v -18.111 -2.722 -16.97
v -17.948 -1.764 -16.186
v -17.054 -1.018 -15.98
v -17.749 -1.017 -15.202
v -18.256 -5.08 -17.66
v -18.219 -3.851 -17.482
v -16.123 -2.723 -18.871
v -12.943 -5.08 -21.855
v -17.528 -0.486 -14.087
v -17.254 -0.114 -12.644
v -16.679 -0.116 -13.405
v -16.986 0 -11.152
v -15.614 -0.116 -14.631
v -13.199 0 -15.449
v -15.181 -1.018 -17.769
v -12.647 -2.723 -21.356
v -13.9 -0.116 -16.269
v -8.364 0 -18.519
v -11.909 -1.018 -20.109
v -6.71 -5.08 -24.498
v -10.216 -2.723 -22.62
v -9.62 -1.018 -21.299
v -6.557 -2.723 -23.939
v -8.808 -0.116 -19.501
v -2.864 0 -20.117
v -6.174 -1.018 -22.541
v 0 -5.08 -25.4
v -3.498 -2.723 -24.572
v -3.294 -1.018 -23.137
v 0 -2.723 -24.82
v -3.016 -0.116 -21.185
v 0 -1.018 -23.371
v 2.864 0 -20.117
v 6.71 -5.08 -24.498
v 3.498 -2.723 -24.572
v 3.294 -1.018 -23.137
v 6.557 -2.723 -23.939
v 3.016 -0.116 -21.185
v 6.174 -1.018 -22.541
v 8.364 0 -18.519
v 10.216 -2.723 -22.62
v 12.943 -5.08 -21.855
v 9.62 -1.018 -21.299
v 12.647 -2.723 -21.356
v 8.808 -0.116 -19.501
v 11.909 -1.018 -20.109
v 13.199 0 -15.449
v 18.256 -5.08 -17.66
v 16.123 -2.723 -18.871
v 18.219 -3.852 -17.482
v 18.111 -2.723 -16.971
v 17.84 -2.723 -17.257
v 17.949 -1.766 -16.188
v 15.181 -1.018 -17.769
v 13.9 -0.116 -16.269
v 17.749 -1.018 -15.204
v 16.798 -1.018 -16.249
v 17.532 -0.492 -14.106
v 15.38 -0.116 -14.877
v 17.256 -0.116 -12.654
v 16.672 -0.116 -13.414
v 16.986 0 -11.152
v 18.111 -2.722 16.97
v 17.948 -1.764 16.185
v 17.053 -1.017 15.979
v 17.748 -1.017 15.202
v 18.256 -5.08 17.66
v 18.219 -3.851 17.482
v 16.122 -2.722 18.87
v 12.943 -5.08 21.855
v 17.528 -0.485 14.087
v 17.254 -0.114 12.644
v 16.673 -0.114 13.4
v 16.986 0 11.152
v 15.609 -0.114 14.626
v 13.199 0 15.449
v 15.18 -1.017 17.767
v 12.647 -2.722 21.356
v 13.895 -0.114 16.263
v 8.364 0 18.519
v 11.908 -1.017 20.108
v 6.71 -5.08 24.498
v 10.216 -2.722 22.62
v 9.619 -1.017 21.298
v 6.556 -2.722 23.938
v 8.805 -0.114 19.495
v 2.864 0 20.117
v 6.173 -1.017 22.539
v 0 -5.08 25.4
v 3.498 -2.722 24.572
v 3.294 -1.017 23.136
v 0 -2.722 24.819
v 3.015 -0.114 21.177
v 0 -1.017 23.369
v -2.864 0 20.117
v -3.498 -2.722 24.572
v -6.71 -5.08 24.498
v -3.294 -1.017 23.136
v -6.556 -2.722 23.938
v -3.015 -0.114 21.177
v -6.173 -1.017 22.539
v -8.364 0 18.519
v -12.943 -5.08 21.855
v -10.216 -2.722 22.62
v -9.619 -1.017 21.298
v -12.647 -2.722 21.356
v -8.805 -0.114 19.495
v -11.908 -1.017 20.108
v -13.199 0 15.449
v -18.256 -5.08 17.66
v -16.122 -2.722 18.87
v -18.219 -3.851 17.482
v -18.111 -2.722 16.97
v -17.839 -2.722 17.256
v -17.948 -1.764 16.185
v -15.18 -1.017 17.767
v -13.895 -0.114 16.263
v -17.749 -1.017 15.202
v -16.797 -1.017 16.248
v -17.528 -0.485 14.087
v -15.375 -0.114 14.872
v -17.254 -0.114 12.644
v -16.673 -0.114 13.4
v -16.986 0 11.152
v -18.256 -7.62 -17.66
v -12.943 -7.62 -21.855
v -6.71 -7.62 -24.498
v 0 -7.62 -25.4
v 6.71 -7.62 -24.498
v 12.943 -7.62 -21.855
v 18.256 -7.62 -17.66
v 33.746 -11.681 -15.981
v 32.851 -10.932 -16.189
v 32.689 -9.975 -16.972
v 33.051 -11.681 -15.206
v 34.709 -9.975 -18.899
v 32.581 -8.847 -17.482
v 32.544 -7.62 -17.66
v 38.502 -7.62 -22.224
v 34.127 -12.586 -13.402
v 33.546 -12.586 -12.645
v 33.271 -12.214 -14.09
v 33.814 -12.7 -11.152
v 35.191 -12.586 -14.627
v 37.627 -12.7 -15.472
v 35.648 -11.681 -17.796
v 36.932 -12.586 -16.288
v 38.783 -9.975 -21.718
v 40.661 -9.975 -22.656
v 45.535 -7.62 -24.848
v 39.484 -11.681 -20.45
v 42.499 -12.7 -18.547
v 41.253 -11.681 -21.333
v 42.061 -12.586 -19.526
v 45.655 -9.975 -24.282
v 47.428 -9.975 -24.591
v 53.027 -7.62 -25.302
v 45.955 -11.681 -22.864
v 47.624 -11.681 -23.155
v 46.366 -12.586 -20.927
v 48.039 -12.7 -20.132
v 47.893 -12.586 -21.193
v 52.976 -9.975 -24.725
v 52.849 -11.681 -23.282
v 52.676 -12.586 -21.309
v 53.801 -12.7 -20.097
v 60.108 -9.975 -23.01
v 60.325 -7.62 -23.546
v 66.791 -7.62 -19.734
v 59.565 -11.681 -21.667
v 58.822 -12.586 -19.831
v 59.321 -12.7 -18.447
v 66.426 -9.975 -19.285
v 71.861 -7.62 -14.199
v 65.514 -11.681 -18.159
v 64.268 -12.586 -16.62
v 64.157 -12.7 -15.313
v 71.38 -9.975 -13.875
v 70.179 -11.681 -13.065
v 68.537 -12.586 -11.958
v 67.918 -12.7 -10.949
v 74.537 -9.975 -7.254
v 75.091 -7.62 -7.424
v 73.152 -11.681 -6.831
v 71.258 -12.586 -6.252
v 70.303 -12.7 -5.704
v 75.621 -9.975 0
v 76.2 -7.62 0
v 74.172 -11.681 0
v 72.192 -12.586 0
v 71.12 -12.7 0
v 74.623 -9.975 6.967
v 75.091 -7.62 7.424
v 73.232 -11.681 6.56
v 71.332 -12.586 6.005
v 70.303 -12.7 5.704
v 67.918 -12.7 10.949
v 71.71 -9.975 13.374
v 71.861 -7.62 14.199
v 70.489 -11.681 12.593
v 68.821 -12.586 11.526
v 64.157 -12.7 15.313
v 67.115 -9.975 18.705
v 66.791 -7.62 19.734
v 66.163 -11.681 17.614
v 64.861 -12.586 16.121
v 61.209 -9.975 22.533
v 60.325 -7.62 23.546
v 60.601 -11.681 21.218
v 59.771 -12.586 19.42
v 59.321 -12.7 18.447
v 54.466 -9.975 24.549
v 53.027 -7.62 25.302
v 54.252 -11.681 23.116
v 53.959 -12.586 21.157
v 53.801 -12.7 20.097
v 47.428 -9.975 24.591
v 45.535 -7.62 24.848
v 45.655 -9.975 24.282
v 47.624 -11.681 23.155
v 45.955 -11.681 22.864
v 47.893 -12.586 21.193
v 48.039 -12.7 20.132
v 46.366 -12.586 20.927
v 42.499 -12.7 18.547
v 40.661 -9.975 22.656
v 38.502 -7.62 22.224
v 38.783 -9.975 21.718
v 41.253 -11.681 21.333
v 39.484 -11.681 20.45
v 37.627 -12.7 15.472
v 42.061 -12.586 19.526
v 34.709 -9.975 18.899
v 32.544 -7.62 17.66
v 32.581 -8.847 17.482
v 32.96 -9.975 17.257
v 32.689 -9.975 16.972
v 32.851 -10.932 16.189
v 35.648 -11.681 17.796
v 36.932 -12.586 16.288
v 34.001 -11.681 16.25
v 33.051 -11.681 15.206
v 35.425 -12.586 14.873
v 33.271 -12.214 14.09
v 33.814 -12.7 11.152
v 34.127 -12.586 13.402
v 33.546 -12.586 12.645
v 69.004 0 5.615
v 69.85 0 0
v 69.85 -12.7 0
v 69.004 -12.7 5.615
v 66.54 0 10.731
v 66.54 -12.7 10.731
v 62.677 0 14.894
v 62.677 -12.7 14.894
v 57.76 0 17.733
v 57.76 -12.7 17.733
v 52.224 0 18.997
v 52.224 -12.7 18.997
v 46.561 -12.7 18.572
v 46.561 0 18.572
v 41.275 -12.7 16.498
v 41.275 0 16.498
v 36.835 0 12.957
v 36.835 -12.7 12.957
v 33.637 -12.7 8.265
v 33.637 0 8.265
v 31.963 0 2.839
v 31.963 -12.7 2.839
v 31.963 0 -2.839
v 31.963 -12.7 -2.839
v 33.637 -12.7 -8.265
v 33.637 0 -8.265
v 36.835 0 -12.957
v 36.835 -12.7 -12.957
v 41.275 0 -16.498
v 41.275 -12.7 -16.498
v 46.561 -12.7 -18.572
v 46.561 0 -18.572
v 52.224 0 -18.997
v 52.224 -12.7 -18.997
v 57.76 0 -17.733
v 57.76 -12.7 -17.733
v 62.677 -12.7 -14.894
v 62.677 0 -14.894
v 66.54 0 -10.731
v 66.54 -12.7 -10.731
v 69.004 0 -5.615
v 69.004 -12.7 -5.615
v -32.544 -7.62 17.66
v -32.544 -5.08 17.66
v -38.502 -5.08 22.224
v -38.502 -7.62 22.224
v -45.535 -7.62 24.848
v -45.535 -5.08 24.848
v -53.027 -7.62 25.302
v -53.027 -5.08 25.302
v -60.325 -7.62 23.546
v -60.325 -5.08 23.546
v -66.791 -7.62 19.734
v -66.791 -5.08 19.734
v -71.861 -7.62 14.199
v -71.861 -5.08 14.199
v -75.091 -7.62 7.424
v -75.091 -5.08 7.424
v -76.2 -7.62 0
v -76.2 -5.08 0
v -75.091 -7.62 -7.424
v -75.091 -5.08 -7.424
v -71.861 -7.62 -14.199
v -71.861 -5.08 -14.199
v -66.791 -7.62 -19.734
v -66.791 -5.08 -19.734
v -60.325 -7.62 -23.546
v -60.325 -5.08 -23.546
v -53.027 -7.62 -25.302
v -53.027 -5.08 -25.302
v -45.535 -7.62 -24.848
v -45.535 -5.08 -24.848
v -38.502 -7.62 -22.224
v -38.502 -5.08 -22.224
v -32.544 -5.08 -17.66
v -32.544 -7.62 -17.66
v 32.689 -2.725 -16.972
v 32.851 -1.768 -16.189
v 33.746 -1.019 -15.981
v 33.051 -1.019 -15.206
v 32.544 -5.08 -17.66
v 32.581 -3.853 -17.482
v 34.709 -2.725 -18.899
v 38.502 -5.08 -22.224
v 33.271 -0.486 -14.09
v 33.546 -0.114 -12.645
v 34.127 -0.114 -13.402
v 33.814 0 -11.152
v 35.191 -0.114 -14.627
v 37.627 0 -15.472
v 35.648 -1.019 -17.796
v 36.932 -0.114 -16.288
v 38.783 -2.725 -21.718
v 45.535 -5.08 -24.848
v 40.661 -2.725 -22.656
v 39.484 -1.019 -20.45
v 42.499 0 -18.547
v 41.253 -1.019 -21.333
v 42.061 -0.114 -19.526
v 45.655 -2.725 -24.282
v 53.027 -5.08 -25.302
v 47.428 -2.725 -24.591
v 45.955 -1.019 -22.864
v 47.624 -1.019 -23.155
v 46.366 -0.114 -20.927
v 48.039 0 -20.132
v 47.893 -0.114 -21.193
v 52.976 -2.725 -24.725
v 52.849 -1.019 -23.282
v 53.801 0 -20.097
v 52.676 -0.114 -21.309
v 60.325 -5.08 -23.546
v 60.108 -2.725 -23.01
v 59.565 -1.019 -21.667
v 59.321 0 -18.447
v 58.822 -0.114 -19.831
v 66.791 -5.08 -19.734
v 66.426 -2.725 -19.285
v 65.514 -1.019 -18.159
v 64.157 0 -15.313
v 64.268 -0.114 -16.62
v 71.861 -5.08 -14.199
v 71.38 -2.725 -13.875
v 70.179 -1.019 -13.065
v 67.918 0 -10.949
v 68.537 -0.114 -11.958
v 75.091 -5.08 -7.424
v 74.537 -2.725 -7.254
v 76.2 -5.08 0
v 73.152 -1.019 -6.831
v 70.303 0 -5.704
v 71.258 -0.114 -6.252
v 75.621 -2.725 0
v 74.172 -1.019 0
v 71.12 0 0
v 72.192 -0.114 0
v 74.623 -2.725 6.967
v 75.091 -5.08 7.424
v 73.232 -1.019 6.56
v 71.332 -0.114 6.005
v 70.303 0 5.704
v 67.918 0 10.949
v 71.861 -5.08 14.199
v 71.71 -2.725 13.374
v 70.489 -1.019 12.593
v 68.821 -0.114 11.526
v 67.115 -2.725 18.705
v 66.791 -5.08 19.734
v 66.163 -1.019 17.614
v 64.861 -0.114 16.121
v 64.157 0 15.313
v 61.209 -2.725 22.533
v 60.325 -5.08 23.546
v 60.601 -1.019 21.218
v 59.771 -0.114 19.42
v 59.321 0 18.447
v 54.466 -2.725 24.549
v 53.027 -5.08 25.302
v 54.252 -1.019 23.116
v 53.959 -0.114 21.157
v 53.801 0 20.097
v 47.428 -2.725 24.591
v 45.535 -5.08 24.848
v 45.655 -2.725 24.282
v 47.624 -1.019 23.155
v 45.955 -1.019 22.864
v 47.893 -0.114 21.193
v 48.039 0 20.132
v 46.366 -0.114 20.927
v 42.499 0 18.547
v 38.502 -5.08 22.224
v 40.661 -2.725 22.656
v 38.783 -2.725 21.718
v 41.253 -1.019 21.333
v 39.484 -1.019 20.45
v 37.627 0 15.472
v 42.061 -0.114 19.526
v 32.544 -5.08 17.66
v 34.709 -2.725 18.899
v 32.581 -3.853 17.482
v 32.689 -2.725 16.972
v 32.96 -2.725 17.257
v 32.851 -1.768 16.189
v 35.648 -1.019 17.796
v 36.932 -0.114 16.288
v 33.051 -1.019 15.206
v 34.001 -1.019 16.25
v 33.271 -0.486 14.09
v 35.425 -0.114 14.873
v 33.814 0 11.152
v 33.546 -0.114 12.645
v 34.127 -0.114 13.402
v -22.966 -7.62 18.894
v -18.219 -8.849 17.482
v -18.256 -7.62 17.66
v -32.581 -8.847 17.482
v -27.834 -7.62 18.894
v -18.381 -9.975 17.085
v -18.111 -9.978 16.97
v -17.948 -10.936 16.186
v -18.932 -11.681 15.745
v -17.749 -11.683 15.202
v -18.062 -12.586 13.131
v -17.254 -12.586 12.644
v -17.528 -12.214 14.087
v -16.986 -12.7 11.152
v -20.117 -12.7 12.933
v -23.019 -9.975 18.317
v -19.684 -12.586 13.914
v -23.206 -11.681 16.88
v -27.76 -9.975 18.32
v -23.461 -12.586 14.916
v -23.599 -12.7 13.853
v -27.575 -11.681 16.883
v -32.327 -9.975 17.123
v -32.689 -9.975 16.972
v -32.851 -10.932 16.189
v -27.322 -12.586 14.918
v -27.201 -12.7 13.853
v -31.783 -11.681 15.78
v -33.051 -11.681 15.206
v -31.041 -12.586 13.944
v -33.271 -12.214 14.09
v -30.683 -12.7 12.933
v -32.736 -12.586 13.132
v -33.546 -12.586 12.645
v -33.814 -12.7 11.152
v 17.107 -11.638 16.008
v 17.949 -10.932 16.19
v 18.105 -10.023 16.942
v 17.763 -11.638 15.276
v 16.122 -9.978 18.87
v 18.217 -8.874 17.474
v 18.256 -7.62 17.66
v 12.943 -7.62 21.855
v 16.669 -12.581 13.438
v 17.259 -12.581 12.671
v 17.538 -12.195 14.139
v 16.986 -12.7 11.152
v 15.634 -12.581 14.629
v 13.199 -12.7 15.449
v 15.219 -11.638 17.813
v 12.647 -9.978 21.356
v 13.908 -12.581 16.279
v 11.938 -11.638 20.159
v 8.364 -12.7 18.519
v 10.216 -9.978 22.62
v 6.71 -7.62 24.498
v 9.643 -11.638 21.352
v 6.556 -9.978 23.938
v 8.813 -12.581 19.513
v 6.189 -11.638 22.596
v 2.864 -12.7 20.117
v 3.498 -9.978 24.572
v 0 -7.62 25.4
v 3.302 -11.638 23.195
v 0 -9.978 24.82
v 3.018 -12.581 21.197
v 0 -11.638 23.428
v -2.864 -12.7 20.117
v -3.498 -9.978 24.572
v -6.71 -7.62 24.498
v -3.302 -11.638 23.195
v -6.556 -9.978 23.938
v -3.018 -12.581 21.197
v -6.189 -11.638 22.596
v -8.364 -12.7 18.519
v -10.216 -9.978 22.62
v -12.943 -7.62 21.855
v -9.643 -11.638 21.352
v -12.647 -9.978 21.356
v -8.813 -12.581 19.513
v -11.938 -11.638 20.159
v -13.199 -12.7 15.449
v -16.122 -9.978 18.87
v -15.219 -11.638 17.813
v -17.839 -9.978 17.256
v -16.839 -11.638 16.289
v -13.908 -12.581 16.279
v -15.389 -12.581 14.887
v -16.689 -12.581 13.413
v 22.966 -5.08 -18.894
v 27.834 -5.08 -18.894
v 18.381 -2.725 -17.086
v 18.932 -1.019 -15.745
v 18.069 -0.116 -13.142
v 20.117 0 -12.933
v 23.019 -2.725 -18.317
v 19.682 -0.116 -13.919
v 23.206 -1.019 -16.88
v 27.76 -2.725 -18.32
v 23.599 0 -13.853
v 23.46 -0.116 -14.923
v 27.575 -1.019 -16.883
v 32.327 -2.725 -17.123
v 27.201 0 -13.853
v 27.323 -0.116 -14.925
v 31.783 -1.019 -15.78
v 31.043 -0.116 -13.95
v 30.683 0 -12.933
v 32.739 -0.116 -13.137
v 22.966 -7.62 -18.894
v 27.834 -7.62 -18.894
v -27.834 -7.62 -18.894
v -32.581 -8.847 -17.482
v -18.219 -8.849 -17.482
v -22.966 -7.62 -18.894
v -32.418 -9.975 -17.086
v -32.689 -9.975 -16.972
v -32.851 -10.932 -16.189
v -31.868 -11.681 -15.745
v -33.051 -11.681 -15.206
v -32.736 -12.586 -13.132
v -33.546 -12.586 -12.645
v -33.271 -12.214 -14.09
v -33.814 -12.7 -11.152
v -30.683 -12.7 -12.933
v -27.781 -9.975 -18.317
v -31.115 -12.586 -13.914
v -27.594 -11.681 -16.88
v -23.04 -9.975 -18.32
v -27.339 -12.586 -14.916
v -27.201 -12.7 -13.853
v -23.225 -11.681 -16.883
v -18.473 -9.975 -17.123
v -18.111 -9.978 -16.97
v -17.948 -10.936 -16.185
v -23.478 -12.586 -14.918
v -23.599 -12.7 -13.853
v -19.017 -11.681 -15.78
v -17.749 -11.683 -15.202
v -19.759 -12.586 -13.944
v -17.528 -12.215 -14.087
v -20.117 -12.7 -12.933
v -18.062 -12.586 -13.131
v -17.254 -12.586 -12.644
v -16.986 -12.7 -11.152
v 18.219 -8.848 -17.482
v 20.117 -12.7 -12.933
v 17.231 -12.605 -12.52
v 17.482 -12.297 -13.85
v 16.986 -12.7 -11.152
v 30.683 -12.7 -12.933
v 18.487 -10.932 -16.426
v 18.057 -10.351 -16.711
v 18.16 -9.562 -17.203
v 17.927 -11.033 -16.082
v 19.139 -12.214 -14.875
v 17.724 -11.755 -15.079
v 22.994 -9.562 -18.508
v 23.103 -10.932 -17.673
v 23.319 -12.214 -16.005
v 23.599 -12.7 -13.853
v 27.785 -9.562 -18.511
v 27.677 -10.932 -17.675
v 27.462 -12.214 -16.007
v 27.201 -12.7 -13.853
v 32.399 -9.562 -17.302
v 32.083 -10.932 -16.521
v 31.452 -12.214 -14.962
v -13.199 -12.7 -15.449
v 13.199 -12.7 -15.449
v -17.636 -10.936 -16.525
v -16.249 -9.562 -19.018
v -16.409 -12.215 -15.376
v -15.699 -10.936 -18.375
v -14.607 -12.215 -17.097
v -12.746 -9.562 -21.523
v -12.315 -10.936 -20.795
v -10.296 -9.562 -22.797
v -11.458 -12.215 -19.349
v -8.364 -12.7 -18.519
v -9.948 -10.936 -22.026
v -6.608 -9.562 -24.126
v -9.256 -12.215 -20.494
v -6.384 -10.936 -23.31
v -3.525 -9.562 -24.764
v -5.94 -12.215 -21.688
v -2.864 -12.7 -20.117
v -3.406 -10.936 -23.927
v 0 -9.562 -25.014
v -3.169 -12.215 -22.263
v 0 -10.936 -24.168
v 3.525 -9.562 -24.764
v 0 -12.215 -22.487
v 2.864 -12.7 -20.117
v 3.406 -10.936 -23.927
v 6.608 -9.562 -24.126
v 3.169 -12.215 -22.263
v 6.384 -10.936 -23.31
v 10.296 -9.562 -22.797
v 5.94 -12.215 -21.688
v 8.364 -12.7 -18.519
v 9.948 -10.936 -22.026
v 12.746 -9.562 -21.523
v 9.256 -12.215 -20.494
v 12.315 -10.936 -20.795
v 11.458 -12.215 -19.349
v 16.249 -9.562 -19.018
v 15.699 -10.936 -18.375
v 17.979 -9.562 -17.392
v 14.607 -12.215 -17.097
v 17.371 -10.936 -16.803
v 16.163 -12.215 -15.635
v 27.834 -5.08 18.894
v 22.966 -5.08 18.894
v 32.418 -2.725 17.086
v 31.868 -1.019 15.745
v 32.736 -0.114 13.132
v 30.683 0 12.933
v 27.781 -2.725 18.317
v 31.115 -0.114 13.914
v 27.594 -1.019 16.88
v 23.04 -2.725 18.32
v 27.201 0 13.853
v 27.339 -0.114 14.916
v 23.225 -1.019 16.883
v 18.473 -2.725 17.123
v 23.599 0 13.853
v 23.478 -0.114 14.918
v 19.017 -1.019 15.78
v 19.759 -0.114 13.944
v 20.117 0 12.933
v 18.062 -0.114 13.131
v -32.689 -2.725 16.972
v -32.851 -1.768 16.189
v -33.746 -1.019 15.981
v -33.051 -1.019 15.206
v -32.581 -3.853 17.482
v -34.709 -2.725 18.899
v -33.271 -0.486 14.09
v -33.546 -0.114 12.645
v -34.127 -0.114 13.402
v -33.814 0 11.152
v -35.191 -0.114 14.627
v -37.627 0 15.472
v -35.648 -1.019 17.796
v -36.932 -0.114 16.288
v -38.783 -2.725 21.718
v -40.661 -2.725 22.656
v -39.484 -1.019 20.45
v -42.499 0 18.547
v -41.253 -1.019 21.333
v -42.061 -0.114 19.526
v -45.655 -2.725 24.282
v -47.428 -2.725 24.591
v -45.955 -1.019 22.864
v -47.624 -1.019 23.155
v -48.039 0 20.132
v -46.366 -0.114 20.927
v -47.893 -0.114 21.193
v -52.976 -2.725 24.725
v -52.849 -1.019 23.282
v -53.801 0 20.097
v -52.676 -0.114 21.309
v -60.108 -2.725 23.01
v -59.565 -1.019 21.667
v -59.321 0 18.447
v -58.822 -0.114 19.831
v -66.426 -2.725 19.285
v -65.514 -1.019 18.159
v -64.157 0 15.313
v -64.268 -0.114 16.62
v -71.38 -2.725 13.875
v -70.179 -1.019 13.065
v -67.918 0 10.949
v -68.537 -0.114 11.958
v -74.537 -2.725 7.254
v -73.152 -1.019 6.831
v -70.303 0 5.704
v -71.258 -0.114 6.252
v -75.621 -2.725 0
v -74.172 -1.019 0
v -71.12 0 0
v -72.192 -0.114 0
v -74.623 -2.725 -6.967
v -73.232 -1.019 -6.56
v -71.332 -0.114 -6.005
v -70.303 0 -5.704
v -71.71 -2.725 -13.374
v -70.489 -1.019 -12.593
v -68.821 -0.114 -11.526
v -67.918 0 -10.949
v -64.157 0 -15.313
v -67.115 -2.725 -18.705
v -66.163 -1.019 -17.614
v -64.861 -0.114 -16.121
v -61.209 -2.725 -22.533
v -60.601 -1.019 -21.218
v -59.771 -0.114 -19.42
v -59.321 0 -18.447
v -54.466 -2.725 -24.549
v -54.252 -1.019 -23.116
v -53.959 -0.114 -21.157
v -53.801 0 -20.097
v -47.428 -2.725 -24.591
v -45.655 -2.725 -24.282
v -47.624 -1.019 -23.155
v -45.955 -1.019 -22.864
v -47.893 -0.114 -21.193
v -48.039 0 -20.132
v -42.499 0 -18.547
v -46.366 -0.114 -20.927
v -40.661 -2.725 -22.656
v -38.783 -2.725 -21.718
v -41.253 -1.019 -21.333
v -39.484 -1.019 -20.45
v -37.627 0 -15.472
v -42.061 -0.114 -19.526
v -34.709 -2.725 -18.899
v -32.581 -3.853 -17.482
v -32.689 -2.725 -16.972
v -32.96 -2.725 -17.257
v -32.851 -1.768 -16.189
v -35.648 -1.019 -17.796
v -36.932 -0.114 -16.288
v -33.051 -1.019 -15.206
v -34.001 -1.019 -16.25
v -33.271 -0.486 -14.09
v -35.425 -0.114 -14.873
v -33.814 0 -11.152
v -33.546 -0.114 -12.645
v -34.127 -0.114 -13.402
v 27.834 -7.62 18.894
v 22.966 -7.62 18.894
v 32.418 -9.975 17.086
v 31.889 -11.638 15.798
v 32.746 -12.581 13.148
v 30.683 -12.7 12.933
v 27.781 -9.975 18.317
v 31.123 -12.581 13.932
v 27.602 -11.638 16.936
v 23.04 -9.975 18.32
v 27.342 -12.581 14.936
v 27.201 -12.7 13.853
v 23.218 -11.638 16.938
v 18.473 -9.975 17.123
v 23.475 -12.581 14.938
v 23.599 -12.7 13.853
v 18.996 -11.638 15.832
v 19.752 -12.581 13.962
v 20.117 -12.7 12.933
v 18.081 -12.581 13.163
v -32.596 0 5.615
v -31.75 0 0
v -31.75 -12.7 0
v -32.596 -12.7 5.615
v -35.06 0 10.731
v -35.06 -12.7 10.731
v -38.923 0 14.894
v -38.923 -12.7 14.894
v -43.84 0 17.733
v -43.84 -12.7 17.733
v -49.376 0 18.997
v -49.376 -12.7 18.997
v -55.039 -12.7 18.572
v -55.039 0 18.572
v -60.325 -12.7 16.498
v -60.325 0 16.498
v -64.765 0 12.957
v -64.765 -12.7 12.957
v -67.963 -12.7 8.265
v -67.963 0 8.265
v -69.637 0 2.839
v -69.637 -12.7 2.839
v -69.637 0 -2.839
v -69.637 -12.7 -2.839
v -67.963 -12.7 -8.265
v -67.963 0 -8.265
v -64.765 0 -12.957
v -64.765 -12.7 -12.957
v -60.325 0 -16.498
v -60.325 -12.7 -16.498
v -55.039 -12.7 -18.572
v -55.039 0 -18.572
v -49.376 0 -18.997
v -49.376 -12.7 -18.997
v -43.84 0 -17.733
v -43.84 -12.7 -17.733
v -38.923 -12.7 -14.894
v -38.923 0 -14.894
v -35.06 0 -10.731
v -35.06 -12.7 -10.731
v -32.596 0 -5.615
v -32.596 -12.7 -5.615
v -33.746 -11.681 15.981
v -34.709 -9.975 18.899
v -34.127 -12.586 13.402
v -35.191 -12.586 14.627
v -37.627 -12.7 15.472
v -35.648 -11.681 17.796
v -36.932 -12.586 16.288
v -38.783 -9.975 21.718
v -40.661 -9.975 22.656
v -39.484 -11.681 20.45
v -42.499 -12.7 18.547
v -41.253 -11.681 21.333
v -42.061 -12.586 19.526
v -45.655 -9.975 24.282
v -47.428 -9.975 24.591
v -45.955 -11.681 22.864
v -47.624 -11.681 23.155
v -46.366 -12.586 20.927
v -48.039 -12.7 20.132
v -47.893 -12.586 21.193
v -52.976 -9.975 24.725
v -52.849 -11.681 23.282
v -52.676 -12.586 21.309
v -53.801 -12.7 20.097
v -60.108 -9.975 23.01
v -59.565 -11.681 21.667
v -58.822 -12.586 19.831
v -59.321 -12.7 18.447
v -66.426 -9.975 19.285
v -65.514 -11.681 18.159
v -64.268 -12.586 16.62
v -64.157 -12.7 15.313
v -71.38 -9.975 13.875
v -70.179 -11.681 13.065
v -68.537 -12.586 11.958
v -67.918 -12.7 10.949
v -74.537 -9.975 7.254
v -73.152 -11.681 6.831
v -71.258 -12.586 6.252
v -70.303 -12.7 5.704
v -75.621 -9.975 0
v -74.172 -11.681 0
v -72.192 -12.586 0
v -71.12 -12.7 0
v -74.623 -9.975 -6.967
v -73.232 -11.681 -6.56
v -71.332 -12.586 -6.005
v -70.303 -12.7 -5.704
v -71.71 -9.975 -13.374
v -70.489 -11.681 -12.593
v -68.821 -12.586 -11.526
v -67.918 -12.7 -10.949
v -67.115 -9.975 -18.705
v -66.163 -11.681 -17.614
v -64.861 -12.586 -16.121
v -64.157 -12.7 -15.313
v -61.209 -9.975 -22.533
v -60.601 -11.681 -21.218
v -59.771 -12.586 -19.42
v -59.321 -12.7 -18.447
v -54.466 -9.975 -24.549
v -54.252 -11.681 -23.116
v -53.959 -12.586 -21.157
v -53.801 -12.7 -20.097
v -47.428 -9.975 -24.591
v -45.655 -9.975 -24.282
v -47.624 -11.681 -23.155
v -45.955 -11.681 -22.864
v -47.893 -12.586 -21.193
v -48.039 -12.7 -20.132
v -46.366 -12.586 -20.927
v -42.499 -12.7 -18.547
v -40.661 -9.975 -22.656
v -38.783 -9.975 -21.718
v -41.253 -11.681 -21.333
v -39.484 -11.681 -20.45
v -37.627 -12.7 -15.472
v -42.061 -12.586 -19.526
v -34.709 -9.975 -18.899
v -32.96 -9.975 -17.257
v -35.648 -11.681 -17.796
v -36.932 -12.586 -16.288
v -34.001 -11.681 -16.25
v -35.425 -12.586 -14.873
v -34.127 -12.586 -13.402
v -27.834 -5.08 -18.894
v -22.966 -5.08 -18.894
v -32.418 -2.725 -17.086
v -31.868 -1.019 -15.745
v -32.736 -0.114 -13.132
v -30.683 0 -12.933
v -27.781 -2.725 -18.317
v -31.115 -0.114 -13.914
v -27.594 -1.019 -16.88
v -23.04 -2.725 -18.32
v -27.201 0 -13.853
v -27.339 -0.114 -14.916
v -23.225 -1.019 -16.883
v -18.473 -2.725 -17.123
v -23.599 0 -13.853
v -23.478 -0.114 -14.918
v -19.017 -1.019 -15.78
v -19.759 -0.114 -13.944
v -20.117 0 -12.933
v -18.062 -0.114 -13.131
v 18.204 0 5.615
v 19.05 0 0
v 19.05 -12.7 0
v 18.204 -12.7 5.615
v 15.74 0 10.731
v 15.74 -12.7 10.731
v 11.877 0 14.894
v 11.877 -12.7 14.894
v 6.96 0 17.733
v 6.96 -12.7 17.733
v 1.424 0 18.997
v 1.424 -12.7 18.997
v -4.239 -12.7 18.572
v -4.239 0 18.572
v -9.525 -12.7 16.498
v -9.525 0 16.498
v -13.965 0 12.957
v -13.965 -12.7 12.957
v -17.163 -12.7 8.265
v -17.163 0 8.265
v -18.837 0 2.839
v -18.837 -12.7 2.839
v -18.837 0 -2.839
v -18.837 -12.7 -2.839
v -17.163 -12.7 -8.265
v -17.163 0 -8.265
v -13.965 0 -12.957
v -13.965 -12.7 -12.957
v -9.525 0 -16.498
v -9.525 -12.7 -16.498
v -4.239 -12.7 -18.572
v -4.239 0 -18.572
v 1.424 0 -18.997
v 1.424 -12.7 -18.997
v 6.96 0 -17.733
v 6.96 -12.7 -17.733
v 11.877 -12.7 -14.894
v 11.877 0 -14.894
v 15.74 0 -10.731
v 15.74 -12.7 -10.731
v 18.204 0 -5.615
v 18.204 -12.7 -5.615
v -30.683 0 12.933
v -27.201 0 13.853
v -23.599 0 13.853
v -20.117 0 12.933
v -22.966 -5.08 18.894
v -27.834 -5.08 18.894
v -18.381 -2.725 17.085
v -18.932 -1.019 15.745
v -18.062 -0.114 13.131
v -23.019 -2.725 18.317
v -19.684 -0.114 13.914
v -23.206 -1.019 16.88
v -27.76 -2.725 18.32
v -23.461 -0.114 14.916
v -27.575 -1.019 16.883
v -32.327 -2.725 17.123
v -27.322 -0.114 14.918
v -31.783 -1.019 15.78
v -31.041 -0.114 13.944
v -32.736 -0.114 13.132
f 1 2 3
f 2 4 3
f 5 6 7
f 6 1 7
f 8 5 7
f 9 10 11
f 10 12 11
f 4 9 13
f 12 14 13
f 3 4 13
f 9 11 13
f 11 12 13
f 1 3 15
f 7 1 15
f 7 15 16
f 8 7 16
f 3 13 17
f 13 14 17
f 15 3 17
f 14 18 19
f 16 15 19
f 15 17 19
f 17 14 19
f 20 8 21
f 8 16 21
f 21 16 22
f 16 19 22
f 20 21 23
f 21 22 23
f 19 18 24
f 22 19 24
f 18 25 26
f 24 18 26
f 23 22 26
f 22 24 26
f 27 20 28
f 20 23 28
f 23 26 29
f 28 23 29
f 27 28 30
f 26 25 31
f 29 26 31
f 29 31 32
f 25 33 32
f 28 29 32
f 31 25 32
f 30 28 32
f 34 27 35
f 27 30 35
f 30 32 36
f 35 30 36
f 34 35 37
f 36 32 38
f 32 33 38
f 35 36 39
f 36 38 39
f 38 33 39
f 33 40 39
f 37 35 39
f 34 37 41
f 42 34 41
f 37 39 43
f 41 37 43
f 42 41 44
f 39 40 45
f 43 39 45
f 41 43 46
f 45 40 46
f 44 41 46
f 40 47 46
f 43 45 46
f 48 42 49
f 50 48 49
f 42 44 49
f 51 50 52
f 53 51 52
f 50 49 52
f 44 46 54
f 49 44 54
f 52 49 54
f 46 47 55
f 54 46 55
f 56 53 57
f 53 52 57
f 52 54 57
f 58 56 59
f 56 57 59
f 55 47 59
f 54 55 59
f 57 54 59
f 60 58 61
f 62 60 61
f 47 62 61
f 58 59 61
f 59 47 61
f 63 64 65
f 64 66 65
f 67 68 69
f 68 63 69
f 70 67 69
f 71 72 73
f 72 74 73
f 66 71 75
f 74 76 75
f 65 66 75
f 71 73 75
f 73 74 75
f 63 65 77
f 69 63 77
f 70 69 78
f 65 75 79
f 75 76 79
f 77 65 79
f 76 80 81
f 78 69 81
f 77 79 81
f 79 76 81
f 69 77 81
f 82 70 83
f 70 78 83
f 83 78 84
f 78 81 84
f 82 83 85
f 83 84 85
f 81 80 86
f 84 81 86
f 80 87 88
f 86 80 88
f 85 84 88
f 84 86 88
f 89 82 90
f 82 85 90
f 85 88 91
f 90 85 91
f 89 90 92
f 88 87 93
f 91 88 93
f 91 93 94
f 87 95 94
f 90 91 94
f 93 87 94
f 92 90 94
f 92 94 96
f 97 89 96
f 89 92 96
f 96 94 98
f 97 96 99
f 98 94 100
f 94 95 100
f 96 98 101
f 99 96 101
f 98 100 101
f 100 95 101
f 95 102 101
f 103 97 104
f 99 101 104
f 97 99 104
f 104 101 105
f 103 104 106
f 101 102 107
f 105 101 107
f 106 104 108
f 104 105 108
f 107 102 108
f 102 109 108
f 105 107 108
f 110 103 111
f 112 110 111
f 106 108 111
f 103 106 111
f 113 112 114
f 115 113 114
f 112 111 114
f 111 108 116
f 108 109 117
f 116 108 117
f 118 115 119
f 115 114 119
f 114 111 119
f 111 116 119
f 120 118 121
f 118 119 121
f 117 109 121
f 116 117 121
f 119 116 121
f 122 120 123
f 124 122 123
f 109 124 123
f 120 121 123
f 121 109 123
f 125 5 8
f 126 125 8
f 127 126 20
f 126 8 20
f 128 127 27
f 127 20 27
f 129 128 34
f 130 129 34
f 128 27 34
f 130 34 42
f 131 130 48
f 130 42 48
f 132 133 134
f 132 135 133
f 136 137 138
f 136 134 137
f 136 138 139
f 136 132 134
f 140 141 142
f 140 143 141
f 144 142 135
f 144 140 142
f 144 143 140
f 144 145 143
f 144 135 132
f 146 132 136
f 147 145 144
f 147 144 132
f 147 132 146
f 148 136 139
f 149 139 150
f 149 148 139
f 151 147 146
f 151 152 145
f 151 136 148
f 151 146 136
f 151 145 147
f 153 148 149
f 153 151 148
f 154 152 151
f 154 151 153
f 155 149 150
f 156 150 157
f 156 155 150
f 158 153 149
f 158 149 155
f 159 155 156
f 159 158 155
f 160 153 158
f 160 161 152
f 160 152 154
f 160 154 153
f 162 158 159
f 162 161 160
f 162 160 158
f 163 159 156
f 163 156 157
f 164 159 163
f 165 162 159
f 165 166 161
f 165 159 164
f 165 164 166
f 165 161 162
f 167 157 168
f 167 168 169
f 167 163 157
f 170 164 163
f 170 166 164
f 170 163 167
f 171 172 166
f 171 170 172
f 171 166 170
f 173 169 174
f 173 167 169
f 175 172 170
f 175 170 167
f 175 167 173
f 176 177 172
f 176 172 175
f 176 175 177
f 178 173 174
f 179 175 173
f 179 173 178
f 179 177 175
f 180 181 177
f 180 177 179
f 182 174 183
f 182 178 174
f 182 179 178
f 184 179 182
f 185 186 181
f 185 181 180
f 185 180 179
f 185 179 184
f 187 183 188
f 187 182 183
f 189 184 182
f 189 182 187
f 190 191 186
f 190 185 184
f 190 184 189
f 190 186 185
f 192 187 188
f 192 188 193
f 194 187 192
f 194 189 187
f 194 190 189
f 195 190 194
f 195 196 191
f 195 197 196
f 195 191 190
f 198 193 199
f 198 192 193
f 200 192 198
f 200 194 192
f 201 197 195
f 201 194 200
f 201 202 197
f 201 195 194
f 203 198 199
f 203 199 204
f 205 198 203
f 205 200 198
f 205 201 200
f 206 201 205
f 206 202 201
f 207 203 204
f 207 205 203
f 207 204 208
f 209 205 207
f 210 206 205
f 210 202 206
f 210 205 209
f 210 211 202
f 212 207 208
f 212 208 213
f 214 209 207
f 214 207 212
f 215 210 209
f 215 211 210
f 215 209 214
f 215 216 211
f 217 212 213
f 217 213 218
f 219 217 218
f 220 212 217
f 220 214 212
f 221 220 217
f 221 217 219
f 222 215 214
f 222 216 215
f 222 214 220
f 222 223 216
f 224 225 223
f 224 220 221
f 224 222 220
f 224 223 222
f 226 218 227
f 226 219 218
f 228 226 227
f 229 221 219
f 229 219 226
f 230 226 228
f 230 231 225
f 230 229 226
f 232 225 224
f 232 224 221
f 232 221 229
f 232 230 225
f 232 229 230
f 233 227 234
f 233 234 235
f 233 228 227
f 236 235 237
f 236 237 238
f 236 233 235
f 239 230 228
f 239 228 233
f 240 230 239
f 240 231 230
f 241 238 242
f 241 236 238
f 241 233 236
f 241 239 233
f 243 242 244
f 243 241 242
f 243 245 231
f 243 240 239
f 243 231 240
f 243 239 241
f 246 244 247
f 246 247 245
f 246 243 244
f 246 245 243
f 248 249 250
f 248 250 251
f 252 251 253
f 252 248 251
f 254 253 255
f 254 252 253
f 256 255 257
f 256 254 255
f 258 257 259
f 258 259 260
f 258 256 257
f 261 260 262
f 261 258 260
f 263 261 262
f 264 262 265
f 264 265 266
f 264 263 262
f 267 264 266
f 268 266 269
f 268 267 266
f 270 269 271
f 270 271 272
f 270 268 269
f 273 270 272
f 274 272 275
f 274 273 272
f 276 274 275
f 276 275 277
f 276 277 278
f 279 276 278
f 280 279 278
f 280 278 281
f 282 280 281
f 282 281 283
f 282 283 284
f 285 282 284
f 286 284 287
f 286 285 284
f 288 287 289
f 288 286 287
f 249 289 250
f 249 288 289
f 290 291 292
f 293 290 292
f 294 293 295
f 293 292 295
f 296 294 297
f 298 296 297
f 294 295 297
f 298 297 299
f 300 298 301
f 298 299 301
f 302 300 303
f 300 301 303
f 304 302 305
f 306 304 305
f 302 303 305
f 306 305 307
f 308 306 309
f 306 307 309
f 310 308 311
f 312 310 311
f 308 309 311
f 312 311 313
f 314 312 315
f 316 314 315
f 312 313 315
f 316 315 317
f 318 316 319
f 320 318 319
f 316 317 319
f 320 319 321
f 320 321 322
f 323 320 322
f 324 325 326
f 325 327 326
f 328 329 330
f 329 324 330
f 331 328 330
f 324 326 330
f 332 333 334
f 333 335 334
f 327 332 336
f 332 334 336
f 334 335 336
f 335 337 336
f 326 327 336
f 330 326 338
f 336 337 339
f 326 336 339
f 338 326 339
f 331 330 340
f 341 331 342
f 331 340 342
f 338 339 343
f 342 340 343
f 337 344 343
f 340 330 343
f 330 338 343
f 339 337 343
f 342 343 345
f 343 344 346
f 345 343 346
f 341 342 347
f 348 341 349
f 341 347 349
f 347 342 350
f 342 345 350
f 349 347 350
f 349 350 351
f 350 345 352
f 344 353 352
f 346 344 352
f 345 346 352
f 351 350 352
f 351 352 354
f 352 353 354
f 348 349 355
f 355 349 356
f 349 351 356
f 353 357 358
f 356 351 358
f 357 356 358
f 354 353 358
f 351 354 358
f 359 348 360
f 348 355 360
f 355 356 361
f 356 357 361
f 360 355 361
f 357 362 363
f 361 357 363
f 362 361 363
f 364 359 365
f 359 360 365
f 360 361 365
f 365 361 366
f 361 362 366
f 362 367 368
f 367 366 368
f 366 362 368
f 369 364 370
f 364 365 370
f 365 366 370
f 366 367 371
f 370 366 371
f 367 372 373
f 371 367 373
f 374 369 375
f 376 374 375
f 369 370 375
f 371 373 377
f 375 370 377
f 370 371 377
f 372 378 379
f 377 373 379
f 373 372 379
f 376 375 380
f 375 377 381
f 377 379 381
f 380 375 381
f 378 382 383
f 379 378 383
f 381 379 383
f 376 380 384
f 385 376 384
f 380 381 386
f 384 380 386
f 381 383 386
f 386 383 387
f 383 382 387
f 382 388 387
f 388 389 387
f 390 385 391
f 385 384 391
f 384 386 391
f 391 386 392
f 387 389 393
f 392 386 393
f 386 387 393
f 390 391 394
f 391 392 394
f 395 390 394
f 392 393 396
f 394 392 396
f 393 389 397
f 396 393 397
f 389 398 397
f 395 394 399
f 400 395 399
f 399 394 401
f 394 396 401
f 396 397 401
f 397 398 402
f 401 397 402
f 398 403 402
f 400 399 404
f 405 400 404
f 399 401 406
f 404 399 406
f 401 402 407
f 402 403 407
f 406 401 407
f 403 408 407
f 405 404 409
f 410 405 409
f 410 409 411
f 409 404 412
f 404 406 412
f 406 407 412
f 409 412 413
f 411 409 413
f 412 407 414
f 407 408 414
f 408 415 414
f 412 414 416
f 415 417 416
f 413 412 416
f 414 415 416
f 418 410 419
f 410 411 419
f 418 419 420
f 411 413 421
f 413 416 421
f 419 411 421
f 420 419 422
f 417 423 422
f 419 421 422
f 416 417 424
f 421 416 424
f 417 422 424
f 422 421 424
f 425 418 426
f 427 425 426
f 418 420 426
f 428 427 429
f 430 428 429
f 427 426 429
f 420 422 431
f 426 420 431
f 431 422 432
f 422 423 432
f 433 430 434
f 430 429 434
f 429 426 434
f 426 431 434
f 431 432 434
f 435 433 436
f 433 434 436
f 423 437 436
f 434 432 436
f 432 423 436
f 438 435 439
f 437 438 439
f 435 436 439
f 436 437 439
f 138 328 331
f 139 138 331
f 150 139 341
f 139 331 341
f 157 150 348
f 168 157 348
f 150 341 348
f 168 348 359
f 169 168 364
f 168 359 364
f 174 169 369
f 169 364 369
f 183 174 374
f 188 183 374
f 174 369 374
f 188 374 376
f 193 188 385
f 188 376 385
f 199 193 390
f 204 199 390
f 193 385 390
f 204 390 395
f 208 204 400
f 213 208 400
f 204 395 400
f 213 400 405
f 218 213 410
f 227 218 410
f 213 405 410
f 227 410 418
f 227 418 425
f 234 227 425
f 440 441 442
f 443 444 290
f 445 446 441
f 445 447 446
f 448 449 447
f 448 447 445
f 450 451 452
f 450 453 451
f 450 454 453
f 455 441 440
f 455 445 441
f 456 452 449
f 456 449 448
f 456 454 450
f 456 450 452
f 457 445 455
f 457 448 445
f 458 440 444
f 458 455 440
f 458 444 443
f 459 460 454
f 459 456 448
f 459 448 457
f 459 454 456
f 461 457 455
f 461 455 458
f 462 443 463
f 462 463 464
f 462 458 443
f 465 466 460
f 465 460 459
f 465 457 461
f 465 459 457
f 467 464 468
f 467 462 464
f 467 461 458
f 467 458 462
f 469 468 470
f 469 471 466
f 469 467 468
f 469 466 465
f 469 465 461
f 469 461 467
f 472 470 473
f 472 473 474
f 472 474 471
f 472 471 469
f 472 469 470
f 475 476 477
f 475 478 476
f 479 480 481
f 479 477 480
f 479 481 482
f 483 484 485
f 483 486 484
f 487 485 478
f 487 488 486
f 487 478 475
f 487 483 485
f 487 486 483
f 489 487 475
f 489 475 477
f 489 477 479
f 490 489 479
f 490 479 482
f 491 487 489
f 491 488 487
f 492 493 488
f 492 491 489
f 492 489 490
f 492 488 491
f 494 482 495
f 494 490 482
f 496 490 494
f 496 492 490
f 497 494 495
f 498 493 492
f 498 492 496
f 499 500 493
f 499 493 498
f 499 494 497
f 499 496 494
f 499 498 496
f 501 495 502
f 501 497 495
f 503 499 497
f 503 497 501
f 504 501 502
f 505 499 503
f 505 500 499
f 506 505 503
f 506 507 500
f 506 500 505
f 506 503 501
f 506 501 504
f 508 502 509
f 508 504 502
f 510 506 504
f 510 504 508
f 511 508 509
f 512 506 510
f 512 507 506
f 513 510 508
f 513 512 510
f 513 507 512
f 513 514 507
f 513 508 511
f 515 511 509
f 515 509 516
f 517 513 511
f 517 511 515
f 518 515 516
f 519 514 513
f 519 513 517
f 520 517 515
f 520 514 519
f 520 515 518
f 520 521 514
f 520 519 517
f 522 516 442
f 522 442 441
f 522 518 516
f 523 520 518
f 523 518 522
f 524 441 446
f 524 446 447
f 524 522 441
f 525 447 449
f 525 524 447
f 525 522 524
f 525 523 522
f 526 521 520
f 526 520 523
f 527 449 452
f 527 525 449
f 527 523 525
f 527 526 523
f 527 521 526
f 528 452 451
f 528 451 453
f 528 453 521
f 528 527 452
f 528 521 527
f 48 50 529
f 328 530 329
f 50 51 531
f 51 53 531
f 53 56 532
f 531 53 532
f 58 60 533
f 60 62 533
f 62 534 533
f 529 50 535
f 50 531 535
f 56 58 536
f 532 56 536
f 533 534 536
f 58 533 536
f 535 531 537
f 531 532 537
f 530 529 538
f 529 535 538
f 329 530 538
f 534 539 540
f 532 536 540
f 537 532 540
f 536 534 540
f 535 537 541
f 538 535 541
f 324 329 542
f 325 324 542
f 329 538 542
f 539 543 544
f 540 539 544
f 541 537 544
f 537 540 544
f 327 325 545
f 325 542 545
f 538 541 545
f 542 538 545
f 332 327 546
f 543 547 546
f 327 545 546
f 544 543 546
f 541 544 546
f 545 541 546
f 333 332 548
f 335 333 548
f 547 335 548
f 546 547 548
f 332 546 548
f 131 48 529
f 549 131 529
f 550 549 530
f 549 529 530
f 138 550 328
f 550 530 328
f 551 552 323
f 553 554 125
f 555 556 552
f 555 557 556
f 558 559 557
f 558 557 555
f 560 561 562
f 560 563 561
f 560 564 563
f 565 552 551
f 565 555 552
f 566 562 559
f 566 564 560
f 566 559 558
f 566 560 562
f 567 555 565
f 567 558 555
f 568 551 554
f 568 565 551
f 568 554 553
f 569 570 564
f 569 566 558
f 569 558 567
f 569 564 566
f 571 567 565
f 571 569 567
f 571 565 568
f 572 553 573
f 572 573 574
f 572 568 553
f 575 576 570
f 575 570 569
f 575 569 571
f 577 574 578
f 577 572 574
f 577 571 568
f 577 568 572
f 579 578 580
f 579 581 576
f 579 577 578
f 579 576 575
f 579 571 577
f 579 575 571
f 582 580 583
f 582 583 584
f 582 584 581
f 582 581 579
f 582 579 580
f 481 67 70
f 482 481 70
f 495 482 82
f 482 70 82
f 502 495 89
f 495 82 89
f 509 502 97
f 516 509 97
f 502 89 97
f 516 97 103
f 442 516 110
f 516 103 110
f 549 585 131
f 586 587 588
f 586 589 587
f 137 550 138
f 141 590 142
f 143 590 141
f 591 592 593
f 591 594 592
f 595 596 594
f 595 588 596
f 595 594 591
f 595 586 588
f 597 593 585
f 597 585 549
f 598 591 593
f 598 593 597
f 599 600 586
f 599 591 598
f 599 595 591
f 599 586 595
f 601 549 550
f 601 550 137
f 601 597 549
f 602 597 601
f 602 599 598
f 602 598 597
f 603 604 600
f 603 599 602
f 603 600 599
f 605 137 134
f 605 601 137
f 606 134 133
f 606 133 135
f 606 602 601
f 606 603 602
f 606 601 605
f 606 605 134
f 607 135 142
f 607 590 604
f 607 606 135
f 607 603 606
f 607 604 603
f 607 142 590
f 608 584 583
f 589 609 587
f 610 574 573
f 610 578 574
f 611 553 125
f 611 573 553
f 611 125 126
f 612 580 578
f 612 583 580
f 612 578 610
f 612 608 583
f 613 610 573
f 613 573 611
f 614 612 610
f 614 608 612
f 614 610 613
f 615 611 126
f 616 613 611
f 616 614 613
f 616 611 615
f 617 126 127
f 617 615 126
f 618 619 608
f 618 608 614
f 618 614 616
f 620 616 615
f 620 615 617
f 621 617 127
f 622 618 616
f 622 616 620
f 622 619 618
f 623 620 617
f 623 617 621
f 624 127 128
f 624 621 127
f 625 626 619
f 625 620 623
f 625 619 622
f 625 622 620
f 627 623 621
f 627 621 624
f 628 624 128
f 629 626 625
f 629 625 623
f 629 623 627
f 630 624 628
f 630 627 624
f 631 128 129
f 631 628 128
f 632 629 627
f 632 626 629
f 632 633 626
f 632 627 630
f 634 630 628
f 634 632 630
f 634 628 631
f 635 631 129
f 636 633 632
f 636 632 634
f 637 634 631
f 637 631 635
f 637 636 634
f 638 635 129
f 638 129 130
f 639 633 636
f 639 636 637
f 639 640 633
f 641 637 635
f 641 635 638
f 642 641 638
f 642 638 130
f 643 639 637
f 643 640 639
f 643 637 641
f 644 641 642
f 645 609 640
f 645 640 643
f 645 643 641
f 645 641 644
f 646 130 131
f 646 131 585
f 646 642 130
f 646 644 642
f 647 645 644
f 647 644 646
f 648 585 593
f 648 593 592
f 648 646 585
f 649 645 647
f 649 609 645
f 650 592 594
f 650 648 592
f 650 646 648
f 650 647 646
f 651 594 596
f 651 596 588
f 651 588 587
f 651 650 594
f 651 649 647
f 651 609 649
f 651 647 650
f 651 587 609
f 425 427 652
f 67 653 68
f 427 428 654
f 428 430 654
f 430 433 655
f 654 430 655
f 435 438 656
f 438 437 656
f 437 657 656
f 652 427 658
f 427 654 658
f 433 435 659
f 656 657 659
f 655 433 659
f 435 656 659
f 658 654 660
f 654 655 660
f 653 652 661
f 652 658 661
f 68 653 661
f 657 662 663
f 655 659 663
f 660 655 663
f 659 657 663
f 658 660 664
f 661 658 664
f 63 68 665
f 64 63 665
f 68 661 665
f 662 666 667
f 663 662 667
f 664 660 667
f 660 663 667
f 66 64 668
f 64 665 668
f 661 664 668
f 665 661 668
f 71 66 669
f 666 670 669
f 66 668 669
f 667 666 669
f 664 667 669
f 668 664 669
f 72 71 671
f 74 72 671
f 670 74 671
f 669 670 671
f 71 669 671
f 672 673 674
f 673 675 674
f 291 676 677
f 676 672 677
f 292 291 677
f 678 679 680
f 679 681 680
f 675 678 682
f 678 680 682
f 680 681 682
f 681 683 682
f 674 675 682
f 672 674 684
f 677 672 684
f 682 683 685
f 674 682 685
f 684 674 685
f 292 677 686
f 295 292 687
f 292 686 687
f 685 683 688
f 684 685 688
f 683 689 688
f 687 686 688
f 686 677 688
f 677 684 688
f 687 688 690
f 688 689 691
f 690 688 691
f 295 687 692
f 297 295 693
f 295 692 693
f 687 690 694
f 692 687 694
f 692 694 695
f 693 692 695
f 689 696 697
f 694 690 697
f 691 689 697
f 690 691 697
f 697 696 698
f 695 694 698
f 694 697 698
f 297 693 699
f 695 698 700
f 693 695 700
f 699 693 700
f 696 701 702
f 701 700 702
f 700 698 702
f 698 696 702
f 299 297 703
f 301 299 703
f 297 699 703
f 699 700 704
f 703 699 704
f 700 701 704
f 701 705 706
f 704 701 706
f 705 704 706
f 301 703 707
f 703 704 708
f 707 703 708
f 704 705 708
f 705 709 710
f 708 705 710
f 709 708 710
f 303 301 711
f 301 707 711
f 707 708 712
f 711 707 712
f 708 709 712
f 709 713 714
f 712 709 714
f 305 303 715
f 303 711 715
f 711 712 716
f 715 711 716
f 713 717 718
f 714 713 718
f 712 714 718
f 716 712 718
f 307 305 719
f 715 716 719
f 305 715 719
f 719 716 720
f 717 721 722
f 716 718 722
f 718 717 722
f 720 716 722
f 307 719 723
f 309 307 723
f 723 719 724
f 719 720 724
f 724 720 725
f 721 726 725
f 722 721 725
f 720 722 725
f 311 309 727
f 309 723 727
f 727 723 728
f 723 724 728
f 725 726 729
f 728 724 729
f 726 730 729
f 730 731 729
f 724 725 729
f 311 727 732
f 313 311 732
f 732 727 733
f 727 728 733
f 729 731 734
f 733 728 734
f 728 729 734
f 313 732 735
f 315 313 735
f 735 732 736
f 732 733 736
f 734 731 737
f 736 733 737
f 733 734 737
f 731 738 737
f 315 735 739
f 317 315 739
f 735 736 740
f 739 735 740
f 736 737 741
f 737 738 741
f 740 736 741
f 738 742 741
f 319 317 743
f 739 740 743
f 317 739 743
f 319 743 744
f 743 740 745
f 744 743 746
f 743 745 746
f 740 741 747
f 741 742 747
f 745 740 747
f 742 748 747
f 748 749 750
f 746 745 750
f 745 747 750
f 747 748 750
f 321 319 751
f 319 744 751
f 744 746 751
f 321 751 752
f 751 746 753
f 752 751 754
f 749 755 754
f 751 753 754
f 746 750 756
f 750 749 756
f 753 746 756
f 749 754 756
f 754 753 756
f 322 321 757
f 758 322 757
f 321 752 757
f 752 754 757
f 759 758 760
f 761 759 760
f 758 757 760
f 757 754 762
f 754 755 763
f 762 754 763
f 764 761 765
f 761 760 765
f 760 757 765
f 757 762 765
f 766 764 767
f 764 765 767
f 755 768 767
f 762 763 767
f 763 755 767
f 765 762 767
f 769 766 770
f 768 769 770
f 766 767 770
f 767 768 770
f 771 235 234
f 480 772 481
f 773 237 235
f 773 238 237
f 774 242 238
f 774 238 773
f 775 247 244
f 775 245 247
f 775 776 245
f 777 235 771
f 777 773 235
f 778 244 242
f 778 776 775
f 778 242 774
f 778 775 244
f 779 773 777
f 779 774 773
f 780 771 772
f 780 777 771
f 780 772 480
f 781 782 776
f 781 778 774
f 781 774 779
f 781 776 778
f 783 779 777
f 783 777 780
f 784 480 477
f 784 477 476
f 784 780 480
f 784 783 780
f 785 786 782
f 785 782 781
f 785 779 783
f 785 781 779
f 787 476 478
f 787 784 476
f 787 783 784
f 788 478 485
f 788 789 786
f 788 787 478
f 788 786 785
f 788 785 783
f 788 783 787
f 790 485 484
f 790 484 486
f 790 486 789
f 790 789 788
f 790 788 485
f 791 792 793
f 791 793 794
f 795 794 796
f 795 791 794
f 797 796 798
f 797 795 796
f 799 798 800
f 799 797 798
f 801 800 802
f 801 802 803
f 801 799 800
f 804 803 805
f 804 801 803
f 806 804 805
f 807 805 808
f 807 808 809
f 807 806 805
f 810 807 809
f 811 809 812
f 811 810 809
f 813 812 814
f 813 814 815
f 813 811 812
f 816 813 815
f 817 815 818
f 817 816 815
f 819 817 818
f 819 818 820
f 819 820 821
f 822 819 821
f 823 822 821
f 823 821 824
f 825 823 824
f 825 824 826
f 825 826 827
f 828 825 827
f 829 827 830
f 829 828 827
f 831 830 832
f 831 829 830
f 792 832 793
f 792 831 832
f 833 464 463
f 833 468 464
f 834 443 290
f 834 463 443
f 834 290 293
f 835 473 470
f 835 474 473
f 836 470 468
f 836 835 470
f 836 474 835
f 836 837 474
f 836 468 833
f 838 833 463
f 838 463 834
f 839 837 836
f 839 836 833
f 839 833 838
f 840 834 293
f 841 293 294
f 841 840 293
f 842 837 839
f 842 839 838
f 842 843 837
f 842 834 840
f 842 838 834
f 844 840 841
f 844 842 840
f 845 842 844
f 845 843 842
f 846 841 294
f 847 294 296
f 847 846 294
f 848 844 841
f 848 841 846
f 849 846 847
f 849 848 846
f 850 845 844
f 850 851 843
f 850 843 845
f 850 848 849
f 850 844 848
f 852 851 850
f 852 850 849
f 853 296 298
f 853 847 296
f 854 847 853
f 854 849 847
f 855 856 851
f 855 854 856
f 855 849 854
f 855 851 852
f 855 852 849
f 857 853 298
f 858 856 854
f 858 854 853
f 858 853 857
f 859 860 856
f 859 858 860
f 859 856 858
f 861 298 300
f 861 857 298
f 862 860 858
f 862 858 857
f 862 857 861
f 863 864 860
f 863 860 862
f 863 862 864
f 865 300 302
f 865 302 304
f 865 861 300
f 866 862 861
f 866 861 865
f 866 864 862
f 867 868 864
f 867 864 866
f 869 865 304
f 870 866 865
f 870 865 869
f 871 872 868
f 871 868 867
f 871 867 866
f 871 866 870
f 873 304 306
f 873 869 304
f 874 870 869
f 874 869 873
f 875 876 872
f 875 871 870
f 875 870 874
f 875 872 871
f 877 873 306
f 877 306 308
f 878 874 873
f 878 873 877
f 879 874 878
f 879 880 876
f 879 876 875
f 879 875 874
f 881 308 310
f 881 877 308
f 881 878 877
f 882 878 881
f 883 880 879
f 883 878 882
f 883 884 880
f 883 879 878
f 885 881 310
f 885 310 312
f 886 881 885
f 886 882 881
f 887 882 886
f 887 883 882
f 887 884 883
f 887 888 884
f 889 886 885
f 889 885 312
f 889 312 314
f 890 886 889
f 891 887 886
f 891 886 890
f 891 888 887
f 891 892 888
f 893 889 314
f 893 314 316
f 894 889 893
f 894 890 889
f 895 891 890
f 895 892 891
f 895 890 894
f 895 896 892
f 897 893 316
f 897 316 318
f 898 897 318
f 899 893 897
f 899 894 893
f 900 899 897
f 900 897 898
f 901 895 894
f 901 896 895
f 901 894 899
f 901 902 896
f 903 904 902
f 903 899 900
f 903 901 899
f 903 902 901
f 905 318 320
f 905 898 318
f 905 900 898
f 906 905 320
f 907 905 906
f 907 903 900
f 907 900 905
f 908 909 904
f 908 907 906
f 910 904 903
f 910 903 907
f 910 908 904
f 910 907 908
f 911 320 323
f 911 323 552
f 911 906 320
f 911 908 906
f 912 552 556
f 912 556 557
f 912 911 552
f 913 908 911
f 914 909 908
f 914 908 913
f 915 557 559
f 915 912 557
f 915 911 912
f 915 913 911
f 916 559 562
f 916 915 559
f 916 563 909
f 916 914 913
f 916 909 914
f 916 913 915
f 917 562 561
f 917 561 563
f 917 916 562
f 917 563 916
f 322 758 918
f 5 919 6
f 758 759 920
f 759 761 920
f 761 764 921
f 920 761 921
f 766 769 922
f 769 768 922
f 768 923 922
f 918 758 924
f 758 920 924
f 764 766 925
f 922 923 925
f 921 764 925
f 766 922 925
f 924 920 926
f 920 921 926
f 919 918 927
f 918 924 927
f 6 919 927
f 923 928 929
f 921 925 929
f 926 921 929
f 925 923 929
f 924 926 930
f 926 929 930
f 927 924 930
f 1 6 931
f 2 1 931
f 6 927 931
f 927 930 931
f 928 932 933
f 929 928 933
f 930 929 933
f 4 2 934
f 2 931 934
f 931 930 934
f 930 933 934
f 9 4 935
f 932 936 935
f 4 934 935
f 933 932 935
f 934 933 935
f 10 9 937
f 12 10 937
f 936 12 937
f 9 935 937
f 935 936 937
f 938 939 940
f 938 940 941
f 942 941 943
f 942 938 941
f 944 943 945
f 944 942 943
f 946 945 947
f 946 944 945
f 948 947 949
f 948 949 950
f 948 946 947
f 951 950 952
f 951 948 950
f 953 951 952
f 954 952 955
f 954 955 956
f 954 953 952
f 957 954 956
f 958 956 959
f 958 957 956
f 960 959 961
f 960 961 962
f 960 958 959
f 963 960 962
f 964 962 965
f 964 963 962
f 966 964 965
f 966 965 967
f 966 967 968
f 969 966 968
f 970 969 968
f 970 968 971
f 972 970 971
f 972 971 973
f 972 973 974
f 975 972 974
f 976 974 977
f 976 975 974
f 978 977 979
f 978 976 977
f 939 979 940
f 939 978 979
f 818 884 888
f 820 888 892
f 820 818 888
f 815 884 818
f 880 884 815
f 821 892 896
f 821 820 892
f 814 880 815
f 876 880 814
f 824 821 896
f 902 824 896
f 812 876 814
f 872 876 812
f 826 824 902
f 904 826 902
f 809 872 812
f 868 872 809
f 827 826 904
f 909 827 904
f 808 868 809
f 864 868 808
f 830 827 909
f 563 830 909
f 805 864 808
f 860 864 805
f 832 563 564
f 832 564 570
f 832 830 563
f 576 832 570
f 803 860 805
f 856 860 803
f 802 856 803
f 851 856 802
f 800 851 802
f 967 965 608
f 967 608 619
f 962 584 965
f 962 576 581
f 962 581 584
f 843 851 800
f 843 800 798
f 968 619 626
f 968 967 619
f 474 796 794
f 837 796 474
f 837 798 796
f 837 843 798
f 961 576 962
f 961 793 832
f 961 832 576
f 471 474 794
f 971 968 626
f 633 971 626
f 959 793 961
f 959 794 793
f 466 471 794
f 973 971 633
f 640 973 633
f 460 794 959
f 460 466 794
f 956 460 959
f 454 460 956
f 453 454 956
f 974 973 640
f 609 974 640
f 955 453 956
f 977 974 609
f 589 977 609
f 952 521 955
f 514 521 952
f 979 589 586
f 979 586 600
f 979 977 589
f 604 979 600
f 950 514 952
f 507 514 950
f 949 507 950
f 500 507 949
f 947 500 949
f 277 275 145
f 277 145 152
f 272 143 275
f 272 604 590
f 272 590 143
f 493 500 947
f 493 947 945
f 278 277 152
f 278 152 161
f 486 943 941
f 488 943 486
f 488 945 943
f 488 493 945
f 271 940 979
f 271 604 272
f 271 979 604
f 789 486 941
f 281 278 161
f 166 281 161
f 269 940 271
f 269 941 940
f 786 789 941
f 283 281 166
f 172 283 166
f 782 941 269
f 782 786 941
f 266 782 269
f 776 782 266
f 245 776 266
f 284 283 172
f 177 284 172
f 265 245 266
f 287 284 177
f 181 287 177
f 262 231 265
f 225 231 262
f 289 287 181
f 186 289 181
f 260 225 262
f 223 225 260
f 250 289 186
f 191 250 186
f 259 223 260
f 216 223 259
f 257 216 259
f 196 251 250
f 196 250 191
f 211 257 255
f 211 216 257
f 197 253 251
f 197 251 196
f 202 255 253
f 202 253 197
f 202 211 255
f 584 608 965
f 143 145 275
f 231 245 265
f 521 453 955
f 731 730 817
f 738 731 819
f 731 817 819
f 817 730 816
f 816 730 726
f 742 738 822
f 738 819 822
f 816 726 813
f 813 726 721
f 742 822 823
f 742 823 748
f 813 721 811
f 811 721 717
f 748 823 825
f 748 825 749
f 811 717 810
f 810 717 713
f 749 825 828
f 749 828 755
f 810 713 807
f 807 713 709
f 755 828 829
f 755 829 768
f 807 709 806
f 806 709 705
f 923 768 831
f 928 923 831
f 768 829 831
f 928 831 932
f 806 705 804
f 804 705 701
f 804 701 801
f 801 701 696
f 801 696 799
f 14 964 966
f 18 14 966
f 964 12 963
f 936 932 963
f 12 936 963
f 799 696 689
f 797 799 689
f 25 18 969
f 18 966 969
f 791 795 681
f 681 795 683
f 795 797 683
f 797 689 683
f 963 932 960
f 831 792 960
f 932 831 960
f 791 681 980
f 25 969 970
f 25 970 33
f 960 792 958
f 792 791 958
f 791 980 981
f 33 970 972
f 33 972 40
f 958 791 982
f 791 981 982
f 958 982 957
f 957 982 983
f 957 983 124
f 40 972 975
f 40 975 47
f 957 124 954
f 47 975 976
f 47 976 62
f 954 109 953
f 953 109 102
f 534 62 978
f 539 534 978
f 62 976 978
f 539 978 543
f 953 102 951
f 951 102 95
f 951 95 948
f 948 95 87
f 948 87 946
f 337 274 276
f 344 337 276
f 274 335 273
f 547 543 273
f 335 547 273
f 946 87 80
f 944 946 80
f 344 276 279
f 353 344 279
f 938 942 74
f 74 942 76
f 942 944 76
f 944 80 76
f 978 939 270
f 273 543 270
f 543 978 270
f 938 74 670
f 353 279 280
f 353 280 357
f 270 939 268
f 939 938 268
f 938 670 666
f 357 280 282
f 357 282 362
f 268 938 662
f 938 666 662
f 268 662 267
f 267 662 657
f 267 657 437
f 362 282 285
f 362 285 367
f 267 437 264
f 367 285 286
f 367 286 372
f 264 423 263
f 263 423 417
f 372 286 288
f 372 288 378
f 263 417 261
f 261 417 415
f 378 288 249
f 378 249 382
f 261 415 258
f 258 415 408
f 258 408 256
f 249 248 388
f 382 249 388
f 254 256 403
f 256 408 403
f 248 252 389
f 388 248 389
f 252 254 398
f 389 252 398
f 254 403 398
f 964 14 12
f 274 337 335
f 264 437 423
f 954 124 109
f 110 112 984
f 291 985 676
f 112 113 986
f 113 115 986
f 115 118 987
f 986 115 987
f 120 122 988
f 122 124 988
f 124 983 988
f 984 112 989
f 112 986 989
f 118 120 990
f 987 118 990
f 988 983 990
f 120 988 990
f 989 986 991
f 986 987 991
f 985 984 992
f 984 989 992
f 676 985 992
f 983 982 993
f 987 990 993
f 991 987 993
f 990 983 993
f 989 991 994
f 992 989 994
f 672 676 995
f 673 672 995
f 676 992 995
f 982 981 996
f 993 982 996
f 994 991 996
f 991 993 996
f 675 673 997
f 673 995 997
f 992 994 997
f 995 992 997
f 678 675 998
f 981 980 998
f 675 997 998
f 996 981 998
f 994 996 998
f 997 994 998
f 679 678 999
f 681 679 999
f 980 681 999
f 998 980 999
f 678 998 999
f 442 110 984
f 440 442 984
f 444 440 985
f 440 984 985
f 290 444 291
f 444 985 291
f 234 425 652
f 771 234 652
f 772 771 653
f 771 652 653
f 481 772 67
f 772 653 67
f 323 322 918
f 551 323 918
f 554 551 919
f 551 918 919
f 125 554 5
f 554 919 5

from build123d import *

# Parameters (mm, degrees)
F0_R     = 19.05
F1_DEPTH = 12.7
F2_R     = 5.08


with BuildPart() as f1:
    # F0 (on Front) → F1 (new body)
    with BuildSketch(Plane.XZ):
        with BuildLine():
            ThreePointArc((-32.54375, 17.659823), (-76.2, 0), (-32.54375, -17.659823))
            ThreePointArc((-32.54375, -17.659823), (-25.4, -19.05), (-18.25625, -17.659823))
            ThreePointArc((-18.25625, -17.659823), (0, -25.4), (18.25625, -17.659823))
            ThreePointArc((18.25625, -17.659823), (25.4, -19.05), (32.54375, -17.659823))
            ThreePointArc((32.54375, -17.659823), (76.2, 0), (32.54375, 17.659823))
            ThreePointArc((32.54375, 17.659823), (25.4, 19.05), (18.25625, 17.659823))
            ThreePointArc((18.25625, 17.659823), (0, 25.4), (-18.25625, 17.659823))
            ThreePointArc((-18.25625, 17.659823), (-25.4, 19.05), (-32.54375, 17.659823))
        make_face()
        with Locations((-50.8, 0)):
            Circle(F0_R, mode=Mode.SUBTRACT)
        Circle(F0_R, mode=Mode.SUBTRACT)
        with Locations((50.8, 0)):
            Circle(F0_R, mode=Mode.SUBTRACT)
    extrude(amount=F1_DEPTH)

    # F2
    f2_edges = [f1.edges().sort_by_distance(p)[0] for p in [
        (-76.2, -12.7, 0),
        (-76.2, 0, 0),
        (-25.4, -12.7, 19.05),
        (-25.4, 0, 19.05),
        (0, 0, 25.4),
        (0, -12.7, 25.4),
        (25.4, -12.7, 19.05),
        (25.4, 0, 19.05),
        (76.2, -12.7, 0),
        (76.2, 0, 0),
        (-25.4, 0, -19.05),
        (-25.4, -12.7, -19.05),
        (0, -12.7, -25.4),
        (0, 0, -25.4),
        (25.4, 0, -19.05),
        (25.4, -12.7, -19.05),
    ]]
    fillet(f2_edges, radius=F2_R)


solid = f1.part
